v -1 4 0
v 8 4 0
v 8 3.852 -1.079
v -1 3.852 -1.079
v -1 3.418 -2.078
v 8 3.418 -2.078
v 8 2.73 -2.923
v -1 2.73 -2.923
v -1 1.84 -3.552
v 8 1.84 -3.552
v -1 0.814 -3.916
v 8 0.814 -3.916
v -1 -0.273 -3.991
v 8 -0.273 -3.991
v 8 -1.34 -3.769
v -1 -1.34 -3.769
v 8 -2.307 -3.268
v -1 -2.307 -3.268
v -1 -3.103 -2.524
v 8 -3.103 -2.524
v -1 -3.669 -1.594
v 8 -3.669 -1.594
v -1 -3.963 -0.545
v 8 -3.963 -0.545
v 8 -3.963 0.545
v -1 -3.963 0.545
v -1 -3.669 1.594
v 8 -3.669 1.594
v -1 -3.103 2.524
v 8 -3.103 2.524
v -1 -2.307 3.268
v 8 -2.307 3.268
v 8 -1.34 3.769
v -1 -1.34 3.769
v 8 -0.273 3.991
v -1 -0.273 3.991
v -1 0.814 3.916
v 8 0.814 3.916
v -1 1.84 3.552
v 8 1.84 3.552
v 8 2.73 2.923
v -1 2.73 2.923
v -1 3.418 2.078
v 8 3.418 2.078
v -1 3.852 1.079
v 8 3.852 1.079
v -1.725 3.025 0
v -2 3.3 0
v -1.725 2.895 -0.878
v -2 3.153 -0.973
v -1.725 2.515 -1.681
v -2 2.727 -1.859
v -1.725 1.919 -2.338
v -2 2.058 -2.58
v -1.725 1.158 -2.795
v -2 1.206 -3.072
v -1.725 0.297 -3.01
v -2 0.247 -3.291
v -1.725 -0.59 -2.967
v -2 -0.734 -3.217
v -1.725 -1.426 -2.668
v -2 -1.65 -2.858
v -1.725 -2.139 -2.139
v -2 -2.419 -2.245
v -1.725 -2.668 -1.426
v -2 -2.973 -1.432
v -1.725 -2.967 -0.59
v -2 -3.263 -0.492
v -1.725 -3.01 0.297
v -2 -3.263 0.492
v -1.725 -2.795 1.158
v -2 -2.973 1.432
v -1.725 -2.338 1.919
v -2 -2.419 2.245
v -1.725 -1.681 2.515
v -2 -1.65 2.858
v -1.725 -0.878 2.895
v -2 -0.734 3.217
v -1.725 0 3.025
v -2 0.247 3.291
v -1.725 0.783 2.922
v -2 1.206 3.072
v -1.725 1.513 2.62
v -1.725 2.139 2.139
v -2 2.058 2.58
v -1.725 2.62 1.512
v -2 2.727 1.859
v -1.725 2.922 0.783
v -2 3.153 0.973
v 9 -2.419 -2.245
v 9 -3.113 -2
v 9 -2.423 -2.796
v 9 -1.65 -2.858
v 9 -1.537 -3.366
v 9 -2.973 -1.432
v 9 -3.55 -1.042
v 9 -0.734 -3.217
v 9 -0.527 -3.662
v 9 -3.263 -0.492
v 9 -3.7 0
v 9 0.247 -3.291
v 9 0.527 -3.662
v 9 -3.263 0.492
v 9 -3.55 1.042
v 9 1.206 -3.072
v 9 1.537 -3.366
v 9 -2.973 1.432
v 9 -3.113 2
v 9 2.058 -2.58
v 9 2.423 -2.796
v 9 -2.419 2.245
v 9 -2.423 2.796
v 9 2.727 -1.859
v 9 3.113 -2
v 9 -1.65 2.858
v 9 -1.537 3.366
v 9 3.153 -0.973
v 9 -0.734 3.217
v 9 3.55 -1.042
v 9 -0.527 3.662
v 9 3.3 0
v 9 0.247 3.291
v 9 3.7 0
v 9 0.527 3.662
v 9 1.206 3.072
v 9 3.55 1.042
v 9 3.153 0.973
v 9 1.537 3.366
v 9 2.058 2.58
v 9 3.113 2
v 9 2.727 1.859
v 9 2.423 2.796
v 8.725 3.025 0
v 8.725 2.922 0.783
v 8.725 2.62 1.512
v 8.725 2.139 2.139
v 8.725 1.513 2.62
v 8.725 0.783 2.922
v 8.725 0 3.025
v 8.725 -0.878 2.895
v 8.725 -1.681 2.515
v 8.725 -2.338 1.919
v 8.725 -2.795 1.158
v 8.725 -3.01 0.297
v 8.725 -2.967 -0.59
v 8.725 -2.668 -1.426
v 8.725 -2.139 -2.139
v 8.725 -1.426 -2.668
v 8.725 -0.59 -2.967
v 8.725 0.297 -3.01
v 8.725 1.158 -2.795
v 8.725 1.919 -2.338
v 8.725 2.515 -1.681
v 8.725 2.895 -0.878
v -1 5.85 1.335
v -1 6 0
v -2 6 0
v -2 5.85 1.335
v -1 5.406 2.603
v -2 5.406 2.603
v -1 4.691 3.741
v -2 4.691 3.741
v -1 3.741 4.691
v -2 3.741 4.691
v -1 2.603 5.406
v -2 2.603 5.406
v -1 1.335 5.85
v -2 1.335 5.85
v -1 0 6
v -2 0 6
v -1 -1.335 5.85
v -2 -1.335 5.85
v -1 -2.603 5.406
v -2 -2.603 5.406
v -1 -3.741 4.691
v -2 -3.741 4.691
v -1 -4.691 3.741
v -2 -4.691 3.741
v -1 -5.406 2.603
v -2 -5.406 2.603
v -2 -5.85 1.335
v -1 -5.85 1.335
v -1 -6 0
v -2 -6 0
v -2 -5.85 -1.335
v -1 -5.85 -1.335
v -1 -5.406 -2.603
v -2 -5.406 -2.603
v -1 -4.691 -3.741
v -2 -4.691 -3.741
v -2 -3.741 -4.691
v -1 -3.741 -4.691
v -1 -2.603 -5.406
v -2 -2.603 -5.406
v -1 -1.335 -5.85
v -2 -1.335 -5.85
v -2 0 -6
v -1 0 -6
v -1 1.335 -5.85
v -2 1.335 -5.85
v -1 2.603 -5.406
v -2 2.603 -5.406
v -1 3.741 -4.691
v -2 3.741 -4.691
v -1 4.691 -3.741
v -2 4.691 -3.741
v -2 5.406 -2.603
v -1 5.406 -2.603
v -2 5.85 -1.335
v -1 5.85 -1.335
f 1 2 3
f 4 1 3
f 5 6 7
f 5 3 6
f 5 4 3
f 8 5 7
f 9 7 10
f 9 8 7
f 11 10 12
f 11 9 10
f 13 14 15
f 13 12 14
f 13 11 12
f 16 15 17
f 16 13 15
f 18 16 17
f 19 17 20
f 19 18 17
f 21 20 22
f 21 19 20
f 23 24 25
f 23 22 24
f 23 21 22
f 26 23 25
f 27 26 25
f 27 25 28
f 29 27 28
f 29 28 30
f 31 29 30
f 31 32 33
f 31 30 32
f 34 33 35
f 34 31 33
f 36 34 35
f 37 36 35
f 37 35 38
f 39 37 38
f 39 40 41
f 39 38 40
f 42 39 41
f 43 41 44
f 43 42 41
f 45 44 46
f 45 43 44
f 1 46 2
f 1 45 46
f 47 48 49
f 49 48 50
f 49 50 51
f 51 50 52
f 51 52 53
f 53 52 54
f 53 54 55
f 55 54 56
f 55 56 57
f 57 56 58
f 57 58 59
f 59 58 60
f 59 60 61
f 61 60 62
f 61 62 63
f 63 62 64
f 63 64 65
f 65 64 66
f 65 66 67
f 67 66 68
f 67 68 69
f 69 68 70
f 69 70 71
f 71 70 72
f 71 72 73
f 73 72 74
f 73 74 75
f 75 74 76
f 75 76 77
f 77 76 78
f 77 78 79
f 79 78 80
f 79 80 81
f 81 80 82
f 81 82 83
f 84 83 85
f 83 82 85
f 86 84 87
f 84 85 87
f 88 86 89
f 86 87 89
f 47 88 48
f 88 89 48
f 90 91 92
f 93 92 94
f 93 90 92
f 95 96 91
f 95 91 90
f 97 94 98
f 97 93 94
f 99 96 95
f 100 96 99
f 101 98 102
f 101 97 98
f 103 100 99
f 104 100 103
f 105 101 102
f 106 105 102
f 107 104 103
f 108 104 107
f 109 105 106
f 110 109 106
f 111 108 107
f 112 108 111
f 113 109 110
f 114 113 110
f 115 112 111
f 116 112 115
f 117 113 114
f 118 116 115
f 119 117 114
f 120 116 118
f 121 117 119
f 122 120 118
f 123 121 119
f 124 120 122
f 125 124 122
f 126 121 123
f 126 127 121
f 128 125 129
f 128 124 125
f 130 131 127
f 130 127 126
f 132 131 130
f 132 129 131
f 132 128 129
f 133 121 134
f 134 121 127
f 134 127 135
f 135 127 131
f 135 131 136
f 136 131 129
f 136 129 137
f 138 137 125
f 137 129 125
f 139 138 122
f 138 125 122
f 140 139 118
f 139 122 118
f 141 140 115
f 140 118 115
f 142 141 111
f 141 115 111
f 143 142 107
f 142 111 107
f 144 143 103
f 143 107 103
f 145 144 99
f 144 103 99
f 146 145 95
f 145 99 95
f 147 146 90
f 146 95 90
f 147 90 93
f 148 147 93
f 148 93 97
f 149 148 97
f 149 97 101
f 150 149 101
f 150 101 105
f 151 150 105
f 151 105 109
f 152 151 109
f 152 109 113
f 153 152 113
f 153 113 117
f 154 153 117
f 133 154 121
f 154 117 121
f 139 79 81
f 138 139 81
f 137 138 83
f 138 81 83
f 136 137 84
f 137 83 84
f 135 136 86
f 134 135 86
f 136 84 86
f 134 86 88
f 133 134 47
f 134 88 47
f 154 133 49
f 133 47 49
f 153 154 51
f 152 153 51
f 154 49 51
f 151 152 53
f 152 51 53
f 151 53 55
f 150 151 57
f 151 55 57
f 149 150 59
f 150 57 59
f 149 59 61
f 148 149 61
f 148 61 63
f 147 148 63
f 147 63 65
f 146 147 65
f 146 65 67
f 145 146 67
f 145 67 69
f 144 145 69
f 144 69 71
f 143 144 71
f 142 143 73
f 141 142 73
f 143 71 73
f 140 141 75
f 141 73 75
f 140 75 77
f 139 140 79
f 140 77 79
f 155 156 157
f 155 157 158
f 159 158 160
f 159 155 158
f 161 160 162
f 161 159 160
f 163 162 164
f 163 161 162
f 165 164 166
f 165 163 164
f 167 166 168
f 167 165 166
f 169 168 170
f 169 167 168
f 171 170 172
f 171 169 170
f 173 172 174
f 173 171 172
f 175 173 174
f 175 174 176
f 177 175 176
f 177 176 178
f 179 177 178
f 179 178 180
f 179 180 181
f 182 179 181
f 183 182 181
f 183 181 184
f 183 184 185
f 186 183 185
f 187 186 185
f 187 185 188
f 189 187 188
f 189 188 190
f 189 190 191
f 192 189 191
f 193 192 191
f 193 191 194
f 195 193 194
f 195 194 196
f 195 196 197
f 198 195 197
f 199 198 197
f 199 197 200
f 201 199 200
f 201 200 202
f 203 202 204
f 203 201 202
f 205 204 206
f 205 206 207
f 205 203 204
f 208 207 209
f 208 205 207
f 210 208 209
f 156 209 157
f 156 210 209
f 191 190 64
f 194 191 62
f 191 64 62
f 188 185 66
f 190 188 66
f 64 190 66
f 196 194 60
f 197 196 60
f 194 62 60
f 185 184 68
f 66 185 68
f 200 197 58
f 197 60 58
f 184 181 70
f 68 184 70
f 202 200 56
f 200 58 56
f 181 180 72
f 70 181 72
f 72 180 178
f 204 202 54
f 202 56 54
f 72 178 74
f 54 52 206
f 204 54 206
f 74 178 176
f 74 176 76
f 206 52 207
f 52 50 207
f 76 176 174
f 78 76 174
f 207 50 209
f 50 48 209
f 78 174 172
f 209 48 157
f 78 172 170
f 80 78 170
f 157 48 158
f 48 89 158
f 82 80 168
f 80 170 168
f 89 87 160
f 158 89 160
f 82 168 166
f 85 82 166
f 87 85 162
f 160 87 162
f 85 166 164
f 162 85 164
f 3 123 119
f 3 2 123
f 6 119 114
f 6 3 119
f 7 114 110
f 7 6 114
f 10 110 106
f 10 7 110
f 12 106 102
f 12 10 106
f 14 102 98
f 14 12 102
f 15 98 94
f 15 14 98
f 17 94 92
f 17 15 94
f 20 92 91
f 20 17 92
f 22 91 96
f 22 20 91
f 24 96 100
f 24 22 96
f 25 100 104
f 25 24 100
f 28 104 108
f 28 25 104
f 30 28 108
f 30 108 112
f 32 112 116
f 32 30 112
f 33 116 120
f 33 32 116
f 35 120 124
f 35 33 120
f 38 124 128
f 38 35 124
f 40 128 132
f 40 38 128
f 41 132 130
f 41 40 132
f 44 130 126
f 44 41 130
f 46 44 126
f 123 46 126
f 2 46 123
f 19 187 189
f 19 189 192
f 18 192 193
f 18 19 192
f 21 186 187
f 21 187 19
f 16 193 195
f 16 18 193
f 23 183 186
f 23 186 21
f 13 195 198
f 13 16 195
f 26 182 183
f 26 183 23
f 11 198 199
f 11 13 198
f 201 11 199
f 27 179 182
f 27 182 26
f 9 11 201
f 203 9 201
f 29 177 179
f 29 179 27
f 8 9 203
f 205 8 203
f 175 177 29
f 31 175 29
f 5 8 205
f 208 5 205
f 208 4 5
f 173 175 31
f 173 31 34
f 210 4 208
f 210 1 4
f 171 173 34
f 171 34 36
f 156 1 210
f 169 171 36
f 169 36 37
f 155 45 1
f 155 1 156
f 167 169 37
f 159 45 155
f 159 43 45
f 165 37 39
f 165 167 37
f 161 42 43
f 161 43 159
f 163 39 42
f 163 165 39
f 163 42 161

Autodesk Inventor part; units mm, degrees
ref_plane "YZ Plane" through (0, 0, 0) normal (1, 0, 0) x (0, 1, 0)
ref_plane "XZ Plane" through (0, 0, 0) normal (0, 1, 0) x (-1, 0, 0)
ref_plane "XY Plane" through (0, 0, 0) normal (0, 0, 1) x (1, 0, 0)
sketch "Sketch_1" plane through (0, 0, 0) normal (0, 0, 1) x (1, 0, 0)
  line L0 (7, 0) -> (0, 0)
  line L1 (0, 3.3) -> (0.3, 3)
  line L2 (0.3, 3) -> (6.7, 3)
  line L3 (6.7, 3) -> (7, 3.3)
  line L4 (7, 3.3) -> (7, 3.7)
  line L5 (7, 3.7) -> (6, 4)
  line L6 (6, 4) -> (1, 4)
  line L7 (1, 4) -> (1, 6)
  line L8 (1, 6) -> (0, 6)
  line L9 (0, 6) -> (0, 3.3)
revolve "Revolution1" add sketch "Sketch_1" angle 360 about axis through (7, 0, 0) along (1, 0, 0)
sketch "스케치2" plane through (0, 0, 0) normal (-1, 0, 0) x (0, 0, 1)
  circle A0 centre (0, 0) radius 3.3 projected
  circle A1 centre (0, 0) radius 6 projected
  circle A2 centre (0, 0) radius 3.025
  dimension "d1" = 6.05
extrude "돌출1" cut sketch "스케치2" against normal up to surface (7 mm away) contours A2
move faces "이동1" translate (-2, 0, 0) faces at (0, 5.0099, -0.7419) (0.0917, 3.1979, -0.2582) (1, 5.2365, -0.7977) (0.6667, 5.9223, -0.9625)
move faces "이동2" translate (2, 0, 0) faces at (6.1667, -1.7292, 3.5514) (6.9083, 3.1979, -0.2582) (7, 3.5308, -0.2952)
properties part number "80F-0610"
